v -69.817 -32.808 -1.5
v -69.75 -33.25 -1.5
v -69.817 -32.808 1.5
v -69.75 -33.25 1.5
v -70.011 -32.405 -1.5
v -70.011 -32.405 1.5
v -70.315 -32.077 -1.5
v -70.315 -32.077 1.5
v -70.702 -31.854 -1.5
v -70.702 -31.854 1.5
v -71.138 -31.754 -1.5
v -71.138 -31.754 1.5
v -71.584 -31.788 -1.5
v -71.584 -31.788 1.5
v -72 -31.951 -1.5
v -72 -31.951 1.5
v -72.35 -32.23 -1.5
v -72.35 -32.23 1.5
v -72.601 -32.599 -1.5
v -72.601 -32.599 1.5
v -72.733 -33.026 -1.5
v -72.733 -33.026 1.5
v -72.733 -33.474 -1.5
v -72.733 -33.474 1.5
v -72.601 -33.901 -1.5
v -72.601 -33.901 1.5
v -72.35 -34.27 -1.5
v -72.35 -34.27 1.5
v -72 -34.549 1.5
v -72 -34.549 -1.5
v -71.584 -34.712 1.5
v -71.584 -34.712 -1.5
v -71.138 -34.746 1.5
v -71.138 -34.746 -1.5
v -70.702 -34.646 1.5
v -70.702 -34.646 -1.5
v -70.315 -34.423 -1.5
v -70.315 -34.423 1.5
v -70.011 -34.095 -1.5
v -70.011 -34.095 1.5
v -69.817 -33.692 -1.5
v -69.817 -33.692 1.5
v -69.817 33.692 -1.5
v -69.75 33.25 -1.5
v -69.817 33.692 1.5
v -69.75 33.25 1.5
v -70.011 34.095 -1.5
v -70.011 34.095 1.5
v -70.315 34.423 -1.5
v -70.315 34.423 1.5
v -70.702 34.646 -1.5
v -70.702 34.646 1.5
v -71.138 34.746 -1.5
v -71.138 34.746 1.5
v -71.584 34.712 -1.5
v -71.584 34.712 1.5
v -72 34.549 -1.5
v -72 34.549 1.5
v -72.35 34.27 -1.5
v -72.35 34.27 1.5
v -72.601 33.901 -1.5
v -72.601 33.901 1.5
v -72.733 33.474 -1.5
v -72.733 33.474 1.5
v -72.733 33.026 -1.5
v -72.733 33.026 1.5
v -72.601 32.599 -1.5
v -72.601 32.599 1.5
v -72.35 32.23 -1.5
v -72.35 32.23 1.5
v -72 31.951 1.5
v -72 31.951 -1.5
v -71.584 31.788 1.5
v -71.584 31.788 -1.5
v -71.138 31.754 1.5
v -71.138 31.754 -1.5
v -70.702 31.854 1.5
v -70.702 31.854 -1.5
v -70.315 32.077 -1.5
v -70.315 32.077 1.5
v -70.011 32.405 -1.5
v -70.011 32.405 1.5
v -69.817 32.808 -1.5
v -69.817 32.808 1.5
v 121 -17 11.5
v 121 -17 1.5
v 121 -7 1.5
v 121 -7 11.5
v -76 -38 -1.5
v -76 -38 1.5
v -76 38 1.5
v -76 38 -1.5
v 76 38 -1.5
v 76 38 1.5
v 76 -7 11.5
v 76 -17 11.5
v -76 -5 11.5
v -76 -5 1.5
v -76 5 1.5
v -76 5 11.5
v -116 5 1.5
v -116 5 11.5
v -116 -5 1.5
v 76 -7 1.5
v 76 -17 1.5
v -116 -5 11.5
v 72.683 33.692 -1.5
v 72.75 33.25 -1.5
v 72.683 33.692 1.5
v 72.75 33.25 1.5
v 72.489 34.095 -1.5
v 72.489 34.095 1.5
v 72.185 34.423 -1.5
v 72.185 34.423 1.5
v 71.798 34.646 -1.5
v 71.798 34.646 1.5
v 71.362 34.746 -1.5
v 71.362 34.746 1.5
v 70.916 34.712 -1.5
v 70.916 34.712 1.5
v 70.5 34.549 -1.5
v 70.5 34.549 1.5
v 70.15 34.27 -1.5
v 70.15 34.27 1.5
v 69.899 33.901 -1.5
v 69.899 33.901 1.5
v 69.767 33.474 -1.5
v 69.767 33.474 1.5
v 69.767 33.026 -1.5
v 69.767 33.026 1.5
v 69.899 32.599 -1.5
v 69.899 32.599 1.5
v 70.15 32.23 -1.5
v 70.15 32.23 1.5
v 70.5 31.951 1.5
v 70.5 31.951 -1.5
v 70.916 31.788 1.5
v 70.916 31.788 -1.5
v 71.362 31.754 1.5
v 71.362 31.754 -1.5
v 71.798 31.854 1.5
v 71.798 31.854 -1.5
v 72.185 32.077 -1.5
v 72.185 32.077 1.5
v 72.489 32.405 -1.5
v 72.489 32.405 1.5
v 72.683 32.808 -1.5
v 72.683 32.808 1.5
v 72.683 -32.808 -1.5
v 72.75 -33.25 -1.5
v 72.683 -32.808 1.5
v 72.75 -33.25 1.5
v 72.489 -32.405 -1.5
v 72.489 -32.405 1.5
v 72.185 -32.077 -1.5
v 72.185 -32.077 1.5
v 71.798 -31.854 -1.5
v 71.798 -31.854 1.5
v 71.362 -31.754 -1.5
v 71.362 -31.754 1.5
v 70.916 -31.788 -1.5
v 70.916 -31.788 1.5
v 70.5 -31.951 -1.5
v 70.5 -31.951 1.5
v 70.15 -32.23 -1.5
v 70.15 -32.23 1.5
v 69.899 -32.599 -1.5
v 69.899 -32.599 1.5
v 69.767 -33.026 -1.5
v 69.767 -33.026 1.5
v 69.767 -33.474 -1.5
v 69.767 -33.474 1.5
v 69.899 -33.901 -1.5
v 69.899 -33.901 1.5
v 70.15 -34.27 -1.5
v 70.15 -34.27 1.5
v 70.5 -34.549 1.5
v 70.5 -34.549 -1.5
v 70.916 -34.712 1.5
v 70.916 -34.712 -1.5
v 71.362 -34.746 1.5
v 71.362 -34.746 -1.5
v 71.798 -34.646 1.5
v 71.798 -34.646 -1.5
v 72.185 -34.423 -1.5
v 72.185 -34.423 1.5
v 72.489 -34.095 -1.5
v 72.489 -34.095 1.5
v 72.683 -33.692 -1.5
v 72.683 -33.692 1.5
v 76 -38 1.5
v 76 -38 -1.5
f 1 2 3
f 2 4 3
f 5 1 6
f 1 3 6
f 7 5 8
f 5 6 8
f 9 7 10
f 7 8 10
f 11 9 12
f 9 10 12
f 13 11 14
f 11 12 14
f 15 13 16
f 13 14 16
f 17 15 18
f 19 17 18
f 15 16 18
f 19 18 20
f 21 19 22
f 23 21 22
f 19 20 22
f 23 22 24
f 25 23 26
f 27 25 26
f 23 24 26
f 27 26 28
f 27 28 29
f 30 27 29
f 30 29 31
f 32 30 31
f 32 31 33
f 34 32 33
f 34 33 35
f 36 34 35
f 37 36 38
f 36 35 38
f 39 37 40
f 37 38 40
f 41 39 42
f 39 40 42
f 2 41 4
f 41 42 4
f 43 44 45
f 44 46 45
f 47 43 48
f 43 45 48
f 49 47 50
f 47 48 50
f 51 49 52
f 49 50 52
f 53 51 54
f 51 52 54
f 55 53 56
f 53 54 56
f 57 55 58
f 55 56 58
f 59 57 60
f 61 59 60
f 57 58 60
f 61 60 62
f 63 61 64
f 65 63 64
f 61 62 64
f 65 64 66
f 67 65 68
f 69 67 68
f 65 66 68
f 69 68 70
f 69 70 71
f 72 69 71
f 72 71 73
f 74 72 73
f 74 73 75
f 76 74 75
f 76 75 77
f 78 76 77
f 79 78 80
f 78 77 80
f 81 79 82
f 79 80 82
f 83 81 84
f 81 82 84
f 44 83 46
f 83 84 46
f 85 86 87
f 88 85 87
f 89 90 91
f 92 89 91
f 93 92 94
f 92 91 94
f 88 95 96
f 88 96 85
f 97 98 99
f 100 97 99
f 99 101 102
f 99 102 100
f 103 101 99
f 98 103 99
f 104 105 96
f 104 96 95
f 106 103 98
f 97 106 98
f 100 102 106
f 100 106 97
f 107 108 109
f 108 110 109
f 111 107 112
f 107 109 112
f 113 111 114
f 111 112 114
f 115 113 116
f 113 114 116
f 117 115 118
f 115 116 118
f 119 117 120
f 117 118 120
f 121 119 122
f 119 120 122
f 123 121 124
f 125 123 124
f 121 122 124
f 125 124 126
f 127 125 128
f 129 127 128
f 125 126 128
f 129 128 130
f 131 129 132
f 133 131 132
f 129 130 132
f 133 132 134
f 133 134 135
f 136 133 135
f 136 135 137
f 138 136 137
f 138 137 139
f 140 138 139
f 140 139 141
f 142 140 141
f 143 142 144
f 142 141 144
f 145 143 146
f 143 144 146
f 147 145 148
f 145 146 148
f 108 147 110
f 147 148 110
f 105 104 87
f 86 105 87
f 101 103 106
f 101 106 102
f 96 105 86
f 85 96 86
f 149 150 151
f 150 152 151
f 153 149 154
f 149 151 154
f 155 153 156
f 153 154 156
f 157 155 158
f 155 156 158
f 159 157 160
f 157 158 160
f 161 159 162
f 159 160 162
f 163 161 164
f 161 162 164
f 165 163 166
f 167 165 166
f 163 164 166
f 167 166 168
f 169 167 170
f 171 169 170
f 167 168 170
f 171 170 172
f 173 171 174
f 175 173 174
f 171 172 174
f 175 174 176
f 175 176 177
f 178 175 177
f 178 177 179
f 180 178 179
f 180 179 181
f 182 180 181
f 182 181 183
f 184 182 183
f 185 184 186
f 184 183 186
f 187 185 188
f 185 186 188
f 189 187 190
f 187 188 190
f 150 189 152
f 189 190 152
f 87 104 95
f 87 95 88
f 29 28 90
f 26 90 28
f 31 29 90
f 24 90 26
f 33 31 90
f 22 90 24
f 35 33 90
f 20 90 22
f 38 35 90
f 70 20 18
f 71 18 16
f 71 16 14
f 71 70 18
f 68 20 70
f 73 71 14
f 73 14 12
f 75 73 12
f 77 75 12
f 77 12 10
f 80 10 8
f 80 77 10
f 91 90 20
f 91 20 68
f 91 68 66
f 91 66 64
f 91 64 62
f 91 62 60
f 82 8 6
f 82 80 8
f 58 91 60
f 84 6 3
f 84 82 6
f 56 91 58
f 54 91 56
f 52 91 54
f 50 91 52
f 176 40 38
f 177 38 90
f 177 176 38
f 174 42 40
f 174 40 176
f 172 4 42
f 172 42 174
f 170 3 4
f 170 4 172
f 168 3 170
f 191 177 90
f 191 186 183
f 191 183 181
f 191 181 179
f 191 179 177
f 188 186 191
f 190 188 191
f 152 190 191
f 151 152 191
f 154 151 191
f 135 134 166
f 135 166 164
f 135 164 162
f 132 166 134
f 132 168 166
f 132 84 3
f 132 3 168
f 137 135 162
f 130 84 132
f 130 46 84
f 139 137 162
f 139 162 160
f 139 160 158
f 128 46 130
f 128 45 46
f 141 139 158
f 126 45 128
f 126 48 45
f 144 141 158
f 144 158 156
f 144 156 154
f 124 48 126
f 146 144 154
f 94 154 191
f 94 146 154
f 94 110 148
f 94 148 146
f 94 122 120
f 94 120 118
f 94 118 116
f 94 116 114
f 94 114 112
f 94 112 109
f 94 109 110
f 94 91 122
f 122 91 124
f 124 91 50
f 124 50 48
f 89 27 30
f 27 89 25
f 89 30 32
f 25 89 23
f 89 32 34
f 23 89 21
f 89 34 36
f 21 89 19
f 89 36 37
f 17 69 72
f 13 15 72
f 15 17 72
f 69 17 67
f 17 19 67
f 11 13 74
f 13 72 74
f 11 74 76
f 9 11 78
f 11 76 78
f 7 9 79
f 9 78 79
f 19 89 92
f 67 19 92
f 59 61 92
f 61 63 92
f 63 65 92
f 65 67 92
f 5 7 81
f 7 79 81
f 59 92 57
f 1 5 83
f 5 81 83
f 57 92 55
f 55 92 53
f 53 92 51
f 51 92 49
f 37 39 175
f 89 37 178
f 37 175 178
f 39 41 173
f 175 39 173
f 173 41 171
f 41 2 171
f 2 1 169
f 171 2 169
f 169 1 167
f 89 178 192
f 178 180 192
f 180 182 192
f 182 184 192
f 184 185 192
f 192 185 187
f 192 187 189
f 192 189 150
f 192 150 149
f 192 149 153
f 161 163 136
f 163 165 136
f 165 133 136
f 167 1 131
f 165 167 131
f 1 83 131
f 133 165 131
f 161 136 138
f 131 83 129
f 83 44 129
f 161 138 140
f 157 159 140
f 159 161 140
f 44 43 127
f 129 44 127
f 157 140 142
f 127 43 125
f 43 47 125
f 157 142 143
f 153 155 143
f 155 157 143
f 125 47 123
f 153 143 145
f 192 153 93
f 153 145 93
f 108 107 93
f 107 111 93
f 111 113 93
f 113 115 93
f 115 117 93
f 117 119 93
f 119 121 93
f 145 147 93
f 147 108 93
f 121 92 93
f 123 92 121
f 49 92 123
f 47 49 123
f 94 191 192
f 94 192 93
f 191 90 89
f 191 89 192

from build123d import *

# Parameters (mm, degrees)
SKETCH1_W               = 152
SKETCH1_H               = 76
BOSS_EXTRUDE1_DEPTH     = 1.5
SKETCH3_R               = 1.5
CUT_EXTRUDE1_DEPTH      = 2.5
CUT_EXTRUDE1_DEPTH_BACK = 2.5
SKETCH4_W               = 40
SKETCH4_H               = 10
BOSS_EXTRUDE2_DEPTH     = 10
SKETCH4_W_2             = 45
BOSS_EXTRUDE2_2_DEPTH   = 10


with BuildPart() as part:
    # Sketch1 → Boss-Extrude1 (new body, symmetric)
    with BuildSketch(Plane.XY):
        Rectangle(SKETCH1_W, SKETCH1_H)
    extrude(amount=BOSS_EXTRUDE1_DEPTH, both=True)

    # Sketch3 → Cut-Extrude1 (cut, two sides)
    with BuildSketch(Plane.XY) as cut_extrude1_sk:
        with Locations((-71.25, 33.25)):
            Circle(SKETCH3_R)
        with Locations((71.25, 33.25)):
            Circle(SKETCH3_R)
        with Locations((-71.25, -33.25)):
            Circle(SKETCH3_R)
        with Locations((71.25, -33.25)):
            Circle(SKETCH3_R)
    extrude(amount=CUT_EXTRUDE1_DEPTH, mode=Mode.SUBTRACT)
    extrude(cut_extrude1_sk.sketch, amount=-CUT_EXTRUDE1_DEPTH_BACK, mode=Mode.SUBTRACT)


with BuildPart() as body_2:
    # Sketch4 → Boss-Extrude2 (new body)
    with BuildSketch(Plane.XY.offset(1.5)):
        with Locations((-96, 0)):
            Rectangle(SKETCH4_W, SKETCH4_H)
    extrude(amount=BOSS_EXTRUDE2_DEPTH)


with BuildPart() as body_3:
    # Sketch4 → Boss-Extrude2 2 (new body)
    with BuildSketch(Plane.XY.offset(1.5)):
        with Locations((98.5, -12)):
            Rectangle(SKETCH4_W_2, SKETCH4_H)
    extrude(amount=BOSS_EXTRUDE2_2_DEPTH)


solid = Compound([part.part, body_2.part, body_3.part])
